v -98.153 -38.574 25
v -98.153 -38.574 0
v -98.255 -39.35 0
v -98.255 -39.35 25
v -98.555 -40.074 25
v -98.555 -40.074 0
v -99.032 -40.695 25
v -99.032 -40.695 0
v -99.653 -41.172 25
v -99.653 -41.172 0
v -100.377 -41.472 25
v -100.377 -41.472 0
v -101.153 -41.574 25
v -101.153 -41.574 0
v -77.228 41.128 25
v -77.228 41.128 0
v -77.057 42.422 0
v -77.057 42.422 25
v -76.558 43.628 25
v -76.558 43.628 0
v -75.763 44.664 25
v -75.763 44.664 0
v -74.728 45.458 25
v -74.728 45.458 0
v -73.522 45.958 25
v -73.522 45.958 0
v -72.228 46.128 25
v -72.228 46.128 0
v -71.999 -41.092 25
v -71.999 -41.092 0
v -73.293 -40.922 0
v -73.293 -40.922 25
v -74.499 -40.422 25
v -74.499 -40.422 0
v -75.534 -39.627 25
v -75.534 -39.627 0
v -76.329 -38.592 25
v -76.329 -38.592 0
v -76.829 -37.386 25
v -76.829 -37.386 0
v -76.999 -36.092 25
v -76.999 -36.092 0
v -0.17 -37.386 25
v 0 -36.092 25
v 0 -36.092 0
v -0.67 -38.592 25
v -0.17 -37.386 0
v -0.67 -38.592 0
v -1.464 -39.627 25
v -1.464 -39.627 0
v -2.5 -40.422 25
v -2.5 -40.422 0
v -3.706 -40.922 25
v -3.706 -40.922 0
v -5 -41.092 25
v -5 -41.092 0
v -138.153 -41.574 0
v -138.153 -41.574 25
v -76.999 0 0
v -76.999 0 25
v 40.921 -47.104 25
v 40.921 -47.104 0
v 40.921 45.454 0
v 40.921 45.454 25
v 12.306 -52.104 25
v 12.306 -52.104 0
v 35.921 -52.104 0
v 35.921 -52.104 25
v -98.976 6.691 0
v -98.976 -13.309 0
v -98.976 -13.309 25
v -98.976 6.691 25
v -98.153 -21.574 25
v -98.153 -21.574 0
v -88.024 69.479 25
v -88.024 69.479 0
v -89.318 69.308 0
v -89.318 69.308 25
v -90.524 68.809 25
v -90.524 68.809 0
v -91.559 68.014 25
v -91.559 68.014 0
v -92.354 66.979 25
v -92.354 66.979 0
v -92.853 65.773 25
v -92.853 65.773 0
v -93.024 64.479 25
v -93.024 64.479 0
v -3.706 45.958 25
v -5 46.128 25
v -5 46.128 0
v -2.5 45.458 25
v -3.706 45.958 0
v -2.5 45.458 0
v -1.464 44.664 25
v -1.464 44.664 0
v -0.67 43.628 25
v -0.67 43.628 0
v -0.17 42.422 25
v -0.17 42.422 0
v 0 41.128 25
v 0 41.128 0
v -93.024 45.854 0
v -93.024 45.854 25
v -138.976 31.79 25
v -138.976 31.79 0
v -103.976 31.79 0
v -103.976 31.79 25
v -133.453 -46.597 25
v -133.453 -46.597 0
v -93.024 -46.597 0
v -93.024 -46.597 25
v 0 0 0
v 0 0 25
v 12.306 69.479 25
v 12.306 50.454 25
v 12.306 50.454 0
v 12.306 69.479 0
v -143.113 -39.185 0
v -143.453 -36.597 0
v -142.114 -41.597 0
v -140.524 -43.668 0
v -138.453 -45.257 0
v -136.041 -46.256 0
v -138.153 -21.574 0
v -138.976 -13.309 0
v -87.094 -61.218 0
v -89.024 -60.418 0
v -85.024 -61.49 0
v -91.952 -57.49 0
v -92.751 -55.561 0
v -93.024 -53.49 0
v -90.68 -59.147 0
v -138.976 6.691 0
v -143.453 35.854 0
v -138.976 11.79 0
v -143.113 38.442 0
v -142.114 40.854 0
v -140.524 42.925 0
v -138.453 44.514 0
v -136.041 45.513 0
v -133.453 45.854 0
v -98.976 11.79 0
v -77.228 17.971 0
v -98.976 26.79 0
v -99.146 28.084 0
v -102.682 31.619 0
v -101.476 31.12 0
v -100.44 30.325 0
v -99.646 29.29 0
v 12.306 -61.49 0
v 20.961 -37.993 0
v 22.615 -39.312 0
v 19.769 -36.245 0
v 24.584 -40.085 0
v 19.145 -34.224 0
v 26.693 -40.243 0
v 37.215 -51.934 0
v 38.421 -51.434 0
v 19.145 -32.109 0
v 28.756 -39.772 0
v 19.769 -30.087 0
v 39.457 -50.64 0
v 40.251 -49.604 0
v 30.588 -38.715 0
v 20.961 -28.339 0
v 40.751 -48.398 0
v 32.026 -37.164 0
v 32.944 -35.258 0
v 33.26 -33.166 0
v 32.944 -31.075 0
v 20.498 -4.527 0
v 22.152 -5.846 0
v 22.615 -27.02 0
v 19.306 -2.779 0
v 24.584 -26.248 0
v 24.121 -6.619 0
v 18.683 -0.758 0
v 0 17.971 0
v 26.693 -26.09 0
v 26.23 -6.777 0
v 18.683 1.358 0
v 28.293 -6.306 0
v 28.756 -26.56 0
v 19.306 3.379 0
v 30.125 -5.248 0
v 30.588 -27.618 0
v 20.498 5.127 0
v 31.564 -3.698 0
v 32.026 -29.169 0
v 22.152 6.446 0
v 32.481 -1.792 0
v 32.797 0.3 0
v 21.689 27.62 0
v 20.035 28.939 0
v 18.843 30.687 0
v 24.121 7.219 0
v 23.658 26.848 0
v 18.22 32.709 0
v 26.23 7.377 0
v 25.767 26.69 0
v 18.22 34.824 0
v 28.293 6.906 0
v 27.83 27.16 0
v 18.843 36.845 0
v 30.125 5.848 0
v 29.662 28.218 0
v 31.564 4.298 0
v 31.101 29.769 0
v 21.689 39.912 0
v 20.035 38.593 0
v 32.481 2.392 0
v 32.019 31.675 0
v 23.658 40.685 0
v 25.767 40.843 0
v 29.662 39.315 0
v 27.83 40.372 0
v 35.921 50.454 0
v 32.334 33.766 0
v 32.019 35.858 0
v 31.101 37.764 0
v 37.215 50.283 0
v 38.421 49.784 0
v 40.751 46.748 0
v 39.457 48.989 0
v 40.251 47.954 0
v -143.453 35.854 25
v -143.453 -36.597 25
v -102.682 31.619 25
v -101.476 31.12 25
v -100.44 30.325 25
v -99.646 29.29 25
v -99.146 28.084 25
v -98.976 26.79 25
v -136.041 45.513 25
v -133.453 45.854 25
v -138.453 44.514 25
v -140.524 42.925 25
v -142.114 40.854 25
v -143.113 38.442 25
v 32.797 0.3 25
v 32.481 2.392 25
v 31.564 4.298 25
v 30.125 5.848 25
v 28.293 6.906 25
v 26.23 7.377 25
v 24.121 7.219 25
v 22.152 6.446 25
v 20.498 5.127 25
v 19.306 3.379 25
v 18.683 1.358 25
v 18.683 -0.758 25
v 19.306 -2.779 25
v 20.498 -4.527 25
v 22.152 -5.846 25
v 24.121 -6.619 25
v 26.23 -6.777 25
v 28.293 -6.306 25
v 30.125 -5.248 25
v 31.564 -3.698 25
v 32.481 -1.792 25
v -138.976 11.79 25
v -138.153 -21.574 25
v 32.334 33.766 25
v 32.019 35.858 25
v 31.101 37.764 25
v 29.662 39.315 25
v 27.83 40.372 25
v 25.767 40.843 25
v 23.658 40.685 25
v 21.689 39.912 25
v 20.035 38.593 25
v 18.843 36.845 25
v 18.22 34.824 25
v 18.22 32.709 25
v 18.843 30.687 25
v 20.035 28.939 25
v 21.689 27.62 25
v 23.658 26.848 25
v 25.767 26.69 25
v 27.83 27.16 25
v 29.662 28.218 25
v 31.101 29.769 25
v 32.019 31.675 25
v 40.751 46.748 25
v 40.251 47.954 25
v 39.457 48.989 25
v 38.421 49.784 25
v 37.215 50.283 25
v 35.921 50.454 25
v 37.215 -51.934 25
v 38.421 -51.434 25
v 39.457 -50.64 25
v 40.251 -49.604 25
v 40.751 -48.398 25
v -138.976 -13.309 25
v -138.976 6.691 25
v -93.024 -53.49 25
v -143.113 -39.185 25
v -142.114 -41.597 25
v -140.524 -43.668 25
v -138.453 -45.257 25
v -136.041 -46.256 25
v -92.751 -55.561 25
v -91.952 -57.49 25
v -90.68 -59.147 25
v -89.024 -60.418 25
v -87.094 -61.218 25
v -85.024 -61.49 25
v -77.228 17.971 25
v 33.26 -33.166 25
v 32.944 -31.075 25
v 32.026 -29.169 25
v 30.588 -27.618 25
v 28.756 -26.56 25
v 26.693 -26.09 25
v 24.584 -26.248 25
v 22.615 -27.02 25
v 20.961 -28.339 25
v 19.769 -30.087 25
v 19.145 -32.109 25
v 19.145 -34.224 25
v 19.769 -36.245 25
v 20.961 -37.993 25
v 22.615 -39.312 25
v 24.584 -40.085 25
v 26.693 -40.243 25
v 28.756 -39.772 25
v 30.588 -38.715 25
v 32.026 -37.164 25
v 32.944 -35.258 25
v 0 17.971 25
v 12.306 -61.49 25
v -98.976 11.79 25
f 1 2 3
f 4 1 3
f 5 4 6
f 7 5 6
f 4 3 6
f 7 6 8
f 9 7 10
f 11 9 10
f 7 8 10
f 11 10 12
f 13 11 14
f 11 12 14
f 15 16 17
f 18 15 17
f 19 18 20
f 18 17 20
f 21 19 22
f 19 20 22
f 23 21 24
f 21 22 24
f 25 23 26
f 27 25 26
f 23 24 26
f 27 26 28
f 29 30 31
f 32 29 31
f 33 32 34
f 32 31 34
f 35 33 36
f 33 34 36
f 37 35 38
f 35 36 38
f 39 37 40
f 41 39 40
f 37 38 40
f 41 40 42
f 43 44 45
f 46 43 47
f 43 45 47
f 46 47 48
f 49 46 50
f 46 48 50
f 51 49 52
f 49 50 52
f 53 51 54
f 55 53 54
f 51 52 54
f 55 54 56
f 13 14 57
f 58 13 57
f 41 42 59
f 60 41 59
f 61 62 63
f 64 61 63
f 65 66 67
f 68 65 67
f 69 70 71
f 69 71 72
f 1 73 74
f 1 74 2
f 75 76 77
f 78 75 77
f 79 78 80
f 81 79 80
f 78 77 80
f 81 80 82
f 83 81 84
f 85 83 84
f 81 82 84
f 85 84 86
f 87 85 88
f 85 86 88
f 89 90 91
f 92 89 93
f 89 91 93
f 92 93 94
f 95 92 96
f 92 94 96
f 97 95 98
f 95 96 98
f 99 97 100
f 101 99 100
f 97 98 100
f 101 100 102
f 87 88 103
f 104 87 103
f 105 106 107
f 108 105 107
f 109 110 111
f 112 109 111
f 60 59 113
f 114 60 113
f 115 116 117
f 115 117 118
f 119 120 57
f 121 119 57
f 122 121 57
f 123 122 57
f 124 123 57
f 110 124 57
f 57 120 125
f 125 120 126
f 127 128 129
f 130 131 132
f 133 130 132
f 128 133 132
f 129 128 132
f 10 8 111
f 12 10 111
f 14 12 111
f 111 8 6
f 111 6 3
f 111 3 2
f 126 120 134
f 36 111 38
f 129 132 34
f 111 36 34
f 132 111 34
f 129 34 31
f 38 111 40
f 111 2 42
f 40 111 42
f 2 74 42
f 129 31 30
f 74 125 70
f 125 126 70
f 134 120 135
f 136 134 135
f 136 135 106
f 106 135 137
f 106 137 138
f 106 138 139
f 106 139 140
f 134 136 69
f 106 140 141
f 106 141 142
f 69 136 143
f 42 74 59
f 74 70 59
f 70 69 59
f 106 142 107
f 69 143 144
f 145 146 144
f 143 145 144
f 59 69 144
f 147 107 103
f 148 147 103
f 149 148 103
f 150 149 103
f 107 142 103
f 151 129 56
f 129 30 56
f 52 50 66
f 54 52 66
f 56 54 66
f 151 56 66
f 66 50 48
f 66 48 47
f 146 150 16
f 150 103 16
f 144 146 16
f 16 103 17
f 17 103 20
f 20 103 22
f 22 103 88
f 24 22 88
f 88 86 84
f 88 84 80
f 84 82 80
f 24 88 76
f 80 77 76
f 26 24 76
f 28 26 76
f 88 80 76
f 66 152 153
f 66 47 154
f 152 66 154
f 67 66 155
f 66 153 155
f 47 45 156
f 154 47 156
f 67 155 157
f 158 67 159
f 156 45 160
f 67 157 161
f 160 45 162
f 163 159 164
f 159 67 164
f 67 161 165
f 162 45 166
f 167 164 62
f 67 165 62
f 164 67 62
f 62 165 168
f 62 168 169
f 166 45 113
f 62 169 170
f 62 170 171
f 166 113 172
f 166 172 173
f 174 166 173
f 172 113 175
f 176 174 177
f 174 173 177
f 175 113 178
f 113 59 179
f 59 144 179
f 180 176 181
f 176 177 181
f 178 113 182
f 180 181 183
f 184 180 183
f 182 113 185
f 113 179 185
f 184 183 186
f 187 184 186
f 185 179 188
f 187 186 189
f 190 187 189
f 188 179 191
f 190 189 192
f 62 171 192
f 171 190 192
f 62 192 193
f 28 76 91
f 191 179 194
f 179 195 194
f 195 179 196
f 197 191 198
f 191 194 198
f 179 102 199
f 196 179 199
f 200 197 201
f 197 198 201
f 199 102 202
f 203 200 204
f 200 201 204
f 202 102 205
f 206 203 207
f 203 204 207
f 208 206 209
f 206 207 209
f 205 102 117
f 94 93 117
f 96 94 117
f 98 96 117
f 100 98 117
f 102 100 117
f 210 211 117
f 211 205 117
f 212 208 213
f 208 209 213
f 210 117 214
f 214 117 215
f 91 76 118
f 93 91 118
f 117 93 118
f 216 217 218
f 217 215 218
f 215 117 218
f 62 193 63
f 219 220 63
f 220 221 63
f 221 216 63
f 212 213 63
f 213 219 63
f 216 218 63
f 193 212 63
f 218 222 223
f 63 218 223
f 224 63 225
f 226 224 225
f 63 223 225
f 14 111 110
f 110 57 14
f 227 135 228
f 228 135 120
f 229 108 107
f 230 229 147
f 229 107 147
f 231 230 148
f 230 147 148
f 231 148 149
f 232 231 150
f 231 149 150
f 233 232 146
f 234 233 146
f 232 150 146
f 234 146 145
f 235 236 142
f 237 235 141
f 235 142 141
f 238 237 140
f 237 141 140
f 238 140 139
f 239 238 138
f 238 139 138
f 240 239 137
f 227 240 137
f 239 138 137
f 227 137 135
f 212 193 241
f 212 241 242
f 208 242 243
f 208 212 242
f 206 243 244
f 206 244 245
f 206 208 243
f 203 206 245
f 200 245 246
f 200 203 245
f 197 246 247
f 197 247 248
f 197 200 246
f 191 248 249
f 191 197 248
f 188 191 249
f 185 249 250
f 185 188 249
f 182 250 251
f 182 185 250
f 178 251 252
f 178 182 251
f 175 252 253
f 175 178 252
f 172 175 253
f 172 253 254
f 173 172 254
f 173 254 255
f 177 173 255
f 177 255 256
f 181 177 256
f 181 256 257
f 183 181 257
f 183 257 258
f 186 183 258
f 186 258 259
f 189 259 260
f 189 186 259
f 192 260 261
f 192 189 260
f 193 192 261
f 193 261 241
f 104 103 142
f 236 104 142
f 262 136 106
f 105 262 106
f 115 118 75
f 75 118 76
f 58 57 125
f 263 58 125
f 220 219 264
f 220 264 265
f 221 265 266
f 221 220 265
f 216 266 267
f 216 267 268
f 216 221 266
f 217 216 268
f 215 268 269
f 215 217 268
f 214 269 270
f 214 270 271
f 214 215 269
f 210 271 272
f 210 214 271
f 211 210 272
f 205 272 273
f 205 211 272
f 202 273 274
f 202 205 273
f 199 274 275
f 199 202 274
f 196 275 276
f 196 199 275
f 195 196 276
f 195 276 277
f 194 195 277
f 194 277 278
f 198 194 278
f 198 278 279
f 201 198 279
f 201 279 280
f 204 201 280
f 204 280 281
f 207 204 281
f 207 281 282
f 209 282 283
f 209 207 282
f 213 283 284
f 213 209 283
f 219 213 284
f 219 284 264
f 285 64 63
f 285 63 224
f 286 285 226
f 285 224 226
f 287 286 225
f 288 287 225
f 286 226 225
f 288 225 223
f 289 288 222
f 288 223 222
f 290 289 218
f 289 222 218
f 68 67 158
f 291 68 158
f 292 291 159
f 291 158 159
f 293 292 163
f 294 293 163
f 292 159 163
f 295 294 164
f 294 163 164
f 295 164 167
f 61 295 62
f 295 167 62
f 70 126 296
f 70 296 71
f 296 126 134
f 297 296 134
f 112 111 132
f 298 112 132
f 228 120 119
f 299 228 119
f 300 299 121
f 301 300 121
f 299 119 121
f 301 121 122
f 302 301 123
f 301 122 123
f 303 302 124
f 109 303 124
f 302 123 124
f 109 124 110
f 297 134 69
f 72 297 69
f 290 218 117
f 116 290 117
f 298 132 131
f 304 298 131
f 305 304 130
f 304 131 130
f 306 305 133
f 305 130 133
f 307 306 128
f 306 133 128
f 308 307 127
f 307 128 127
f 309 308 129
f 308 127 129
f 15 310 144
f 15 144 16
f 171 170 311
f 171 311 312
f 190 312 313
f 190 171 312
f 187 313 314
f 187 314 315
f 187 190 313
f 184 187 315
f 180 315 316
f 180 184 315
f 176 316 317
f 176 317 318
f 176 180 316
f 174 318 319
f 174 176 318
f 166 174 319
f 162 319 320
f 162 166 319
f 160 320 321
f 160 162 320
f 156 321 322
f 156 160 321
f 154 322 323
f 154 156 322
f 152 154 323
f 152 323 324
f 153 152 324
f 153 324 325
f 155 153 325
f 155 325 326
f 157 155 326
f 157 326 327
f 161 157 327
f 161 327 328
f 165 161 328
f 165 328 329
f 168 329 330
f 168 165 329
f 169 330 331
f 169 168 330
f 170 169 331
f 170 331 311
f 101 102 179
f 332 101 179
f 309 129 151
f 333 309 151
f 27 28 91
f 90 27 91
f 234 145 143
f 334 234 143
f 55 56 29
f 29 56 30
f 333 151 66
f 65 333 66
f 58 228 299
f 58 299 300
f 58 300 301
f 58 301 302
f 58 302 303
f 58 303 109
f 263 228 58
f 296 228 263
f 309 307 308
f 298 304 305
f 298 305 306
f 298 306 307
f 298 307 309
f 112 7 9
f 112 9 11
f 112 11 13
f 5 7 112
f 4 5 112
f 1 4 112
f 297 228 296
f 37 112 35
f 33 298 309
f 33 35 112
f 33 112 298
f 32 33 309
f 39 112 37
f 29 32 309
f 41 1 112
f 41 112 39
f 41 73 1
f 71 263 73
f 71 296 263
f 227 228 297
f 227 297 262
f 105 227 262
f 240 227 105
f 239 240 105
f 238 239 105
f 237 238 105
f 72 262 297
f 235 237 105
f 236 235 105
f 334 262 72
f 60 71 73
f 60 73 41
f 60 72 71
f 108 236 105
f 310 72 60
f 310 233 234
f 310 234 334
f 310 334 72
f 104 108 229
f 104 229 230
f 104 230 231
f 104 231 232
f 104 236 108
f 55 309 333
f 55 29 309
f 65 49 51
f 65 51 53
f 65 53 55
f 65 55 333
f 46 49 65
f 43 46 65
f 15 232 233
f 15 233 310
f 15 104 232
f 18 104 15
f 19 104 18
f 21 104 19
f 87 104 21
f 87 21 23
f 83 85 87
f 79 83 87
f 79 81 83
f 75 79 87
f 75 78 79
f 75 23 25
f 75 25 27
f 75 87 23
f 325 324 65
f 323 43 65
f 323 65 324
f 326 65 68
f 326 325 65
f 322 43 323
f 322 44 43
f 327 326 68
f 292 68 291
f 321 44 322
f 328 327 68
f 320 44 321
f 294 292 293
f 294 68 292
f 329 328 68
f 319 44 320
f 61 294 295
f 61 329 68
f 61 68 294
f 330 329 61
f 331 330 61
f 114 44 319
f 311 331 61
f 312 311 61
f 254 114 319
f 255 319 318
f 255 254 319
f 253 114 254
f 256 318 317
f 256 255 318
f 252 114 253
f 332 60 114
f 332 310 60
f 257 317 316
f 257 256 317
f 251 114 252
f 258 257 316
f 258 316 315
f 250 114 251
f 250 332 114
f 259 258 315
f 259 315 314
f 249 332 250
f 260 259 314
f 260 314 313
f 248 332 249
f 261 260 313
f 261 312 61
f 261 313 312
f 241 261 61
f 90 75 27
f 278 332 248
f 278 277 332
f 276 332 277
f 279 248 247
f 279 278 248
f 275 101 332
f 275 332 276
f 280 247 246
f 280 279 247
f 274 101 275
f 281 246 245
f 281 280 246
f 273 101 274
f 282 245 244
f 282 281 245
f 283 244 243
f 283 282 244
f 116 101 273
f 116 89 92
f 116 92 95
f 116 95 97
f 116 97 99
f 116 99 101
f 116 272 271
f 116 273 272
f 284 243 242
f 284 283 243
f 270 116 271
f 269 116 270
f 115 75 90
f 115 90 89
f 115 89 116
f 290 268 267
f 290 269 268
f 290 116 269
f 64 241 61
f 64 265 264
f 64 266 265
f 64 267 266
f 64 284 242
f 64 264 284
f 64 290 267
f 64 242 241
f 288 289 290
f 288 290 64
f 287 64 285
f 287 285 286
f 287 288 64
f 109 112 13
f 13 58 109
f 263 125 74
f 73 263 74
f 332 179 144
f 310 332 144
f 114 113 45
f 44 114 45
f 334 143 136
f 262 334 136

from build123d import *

# Parameters (mm, degrees)
F0_W     = 40
F0_H     = 20
F0_R     = 7.096656
F1_DEPTH = 25
F2_R     = 5
F3_DEPTH = 25


with BuildPart() as f1:
    # F0 (on Top) → F1 (new body)
    with BuildSketch(Plane.XY):
        with BuildLine():
            ThreePointArc((-133.453285, 45.853535), (-140.524353, 42.924603), (-143.453285, 35.853535))
            Line((-143.453285, 35.853535), (-143.453285, -36.596949))
            ThreePointArc((-143.453285, -36.596949), (-140.524353, -43.668016), (-133.453285, -46.596949))
            Line((-133.453285, -46.596949), (-93.023613, -46.596949))
            Line((-93.023613, -46.596949), (-93.023613, -53.490194))
            ThreePointArc((-93.023613, -53.490194), (-90.680467, -59.147049), (-85.023613, -61.490194))
            Line((-85.023613, -61.490194), (12.305611, -61.490194))
            Line((12.305611, -61.490194), (12.305611, -52.104292))
            Line((12.305611, -52.104292), (35.921164, -52.104292))
            ThreePointArc((35.921164, -52.104292), (39.456698, -50.639826), (40.921164, -47.104292))
            Line((40.921164, -47.104292), (40.921164, 45.453855))
            ThreePointArc((40.921164, 45.453855), (39.456698, 48.989389), (35.921164, 50.453855))
            Line((35.921164, 50.453855), (12.305611, 50.453855))
            Line((12.305611, 50.453855), (12.305611, 69.478564))
            Line((12.305611, 69.478564), (-88.023613, 69.478564))
            ThreePointArc((-88.023613, 69.478564), (-91.559147, 68.014098), (-93.023613, 64.478564))
            Line((-93.023613, 64.478564), (-93.023613, 45.853535))
            Line((-93.023613, 45.853535), (-133.453285, 45.853535))
        make_face()
        with BuildLine():
            Line((-138.153107, -41.573759), (-138.153107, -21.573759))
            Line((-138.153107, -21.573759), (-98.153107, -21.573759))
            Line((-98.153107, -21.573759), (-98.153107, -38.573759))
            ThreePointArc((-98.153107, -38.573759), (-99.031787, -40.695079), (-101.153107, -41.573759))
            Line((-101.153107, -41.573759), (-138.153107, -41.573759))
        make_face(mode=Mode.SUBTRACT)
        with Locations((-118.975651, -3.308505)):
            Rectangle(F0_W, F0_H, mode=Mode.SUBTRACT)
        with Locations((26.162848, -33.166352)):
            Circle(F0_R, mode=Mode.SUBTRACT)
        with BuildLine():
            Line((-76.998904, -36.091934), (-76.998904, 0))
            Line((-76.998904, 0), (0, 0))
            Line((0, 0), (0, -36.091934))
            ThreePointArc((0, -36.091934), (-1.464466, -39.627468), (-5, -41.091934))
            Line((-5, -41.091934), (-71.998904, -41.091934))
            ThreePointArc((-71.998904, -41.091934), (-75.534438, -39.627468), (-76.998904, -36.091934))
        make_face(mode=Mode.SUBTRACT)
        with Locations((25.7, 0.3)):
            Circle(F0_R, mode=Mode.SUBTRACT)
        with BuildLine():
            Line((-138.975651, 11.789608), (-138.975651, 31.789608))
            Line((-138.975651, 31.789608), (-103.975651, 31.789608))
            ThreePointArc((-103.975651, 31.789608), (-100.440117, 30.325142), (-98.975651, 26.789608))
            Line((-98.975651, 26.789608), (-98.975651, 11.789608))
            Line((-98.975651, 11.789608), (-138.975651, 11.789608))
        make_face(mode=Mode.SUBTRACT)
        with BuildLine():
            ThreePointArc((-77.227831, 41.128273), (-75.763365, 44.663807), (-72.227831, 46.128273))
            Line((-72.227831, 46.128273), (-5, 46.128273))
            ThreePointArc((-5, 46.128273), (-1.464466, 44.663807), (0, 41.128273))
            Line((0, 41.128273), (0, 17.970568))
            Line((0, 17.970568), (-77.227831, 17.970568))
            Line((-77.227831, 17.970568), (-77.227831, 41.128273))
        make_face(mode=Mode.SUBTRACT)
        with Locations((25.237152, 33.766352)):
            Circle(F0_R, mode=Mode.SUBTRACT)
    extrude(amount=F1_DEPTH)

    # F2
    f2_edges = [f1.edges().sort_by_distance(p)[0] for p in [
        (12.305611, -61.490194, 12.5),
        (-85.023613, -61.490194, 12.5),
    ]]
    fillet(f2_edges, radius=F2_R)

    # F0 (on Top) → F3 (join)
    with BuildSketch(Plane.XY):
        with BuildLine():
            ThreePointArc((-133.453285, 45.853535), (-140.524353, 42.924603), (-143.453285, 35.853535))
            Line((-143.453285, 35.853535), (-143.453285, -36.596949))
            ThreePointArc((-143.453285, -36.596949), (-140.524353, -43.668016), (-133.453285, -46.596949))
            Line((-133.453285, -46.596949), (-93.023613, -46.596949))
            Line((-93.023613, -46.596949), (-93.023613, -53.490194))
            ThreePointArc((-93.023613, -53.490194), (-90.680467, -59.147049), (-85.023613, -61.490194))
            Line((-85.023613, -61.490194), (12.305611, -61.490194))
            Line((12.305611, -61.490194), (12.305611, -52.104292))
            Line((12.305611, -52.104292), (35.921164, -52.104292))
            ThreePointArc((35.921164, -52.104292), (39.456698, -50.639826), (40.921164, -47.104292))
            Line((40.921164, -47.104292), (40.921164, 45.453855))
            ThreePointArc((40.921164, 45.453855), (39.456698, 48.989389), (35.921164, 50.453855))
            Line((35.921164, 50.453855), (12.305611, 50.453855))
            Line((12.305611, 50.453855), (12.305611, 69.478564))
            Line((12.305611, 69.478564), (-88.023613, 69.478564))
            ThreePointArc((-88.023613, 69.478564), (-91.559147, 68.014098), (-93.023613, 64.478564))
            Line((-93.023613, 64.478564), (-93.023613, 45.853535))
            Line((-93.023613, 45.853535), (-133.453285, 45.853535))
        make_face()
        with BuildLine():
            Line((-138.153107, -41.573759), (-138.153107, -21.573759))
            Line((-138.153107, -21.573759), (-98.153107, -21.573759))
            Line((-98.153107, -21.573759), (-98.153107, -38.573759))
            ThreePointArc((-98.153107, -38.573759), (-99.031787, -40.695079), (-101.153107, -41.573759))
            Line((-101.153107, -41.573759), (-138.153107, -41.573759))
        make_face(mode=Mode.SUBTRACT)
        with Locations((-118.975651, -3.308505)):
            Rectangle(F0_W, F0_H, mode=Mode.SUBTRACT)
        with Locations((26.162848, -33.166352)):
            Circle(F0_R, mode=Mode.SUBTRACT)
        with BuildLine():
            Line((-76.998904, -36.091934), (-76.998904, 0))
            Line((-76.998904, 0), (0, 0))
            Line((0, 0), (0, -36.091934))
            ThreePointArc((0, -36.091934), (-1.464466, -39.627468), (-5, -41.091934))
            Line((-5, -41.091934), (-71.998904, -41.091934))
            ThreePointArc((-71.998904, -41.091934), (-75.534438, -39.627468), (-76.998904, -36.091934))
        make_face(mode=Mode.SUBTRACT)
        with Locations((25.7, 0.3)):
            Circle(F0_R, mode=Mode.SUBTRACT)
        with BuildLine():
            Line((-138.975651, 11.789608), (-138.975651, 31.789608))
            Line((-138.975651, 31.789608), (-103.975651, 31.789608))
            ThreePointArc((-103.975651, 31.789608), (-100.440117, 30.325142), (-98.975651, 26.789608))
            Line((-98.975651, 26.789608), (-98.975651, 11.789608))
            Line((-98.975651, 11.789608), (-138.975651, 11.789608))
        make_face(mode=Mode.SUBTRACT)
        with BuildLine():
            ThreePointArc((-77.227831, 41.128273), (-75.763365, 44.663807), (-72.227831, 46.128273))
            Line((-72.227831, 46.128273), (-5, 46.128273))
            ThreePointArc((-5, 46.128273), (-1.464466, 44.663807), (0, 41.128273))
            Line((0, 41.128273), (0, 17.970568))
            Line((0, 17.970568), (-77.227831, 17.970568))
            Line((-77.227831, 17.970568), (-77.227831, 41.128273))
        make_face(mode=Mode.SUBTRACT)
        with Locations((25.237152, 33.766352)):
            Circle(F0_R, mode=Mode.SUBTRACT)
    extrude(amount=F3_DEPTH)


solid = f1.part
